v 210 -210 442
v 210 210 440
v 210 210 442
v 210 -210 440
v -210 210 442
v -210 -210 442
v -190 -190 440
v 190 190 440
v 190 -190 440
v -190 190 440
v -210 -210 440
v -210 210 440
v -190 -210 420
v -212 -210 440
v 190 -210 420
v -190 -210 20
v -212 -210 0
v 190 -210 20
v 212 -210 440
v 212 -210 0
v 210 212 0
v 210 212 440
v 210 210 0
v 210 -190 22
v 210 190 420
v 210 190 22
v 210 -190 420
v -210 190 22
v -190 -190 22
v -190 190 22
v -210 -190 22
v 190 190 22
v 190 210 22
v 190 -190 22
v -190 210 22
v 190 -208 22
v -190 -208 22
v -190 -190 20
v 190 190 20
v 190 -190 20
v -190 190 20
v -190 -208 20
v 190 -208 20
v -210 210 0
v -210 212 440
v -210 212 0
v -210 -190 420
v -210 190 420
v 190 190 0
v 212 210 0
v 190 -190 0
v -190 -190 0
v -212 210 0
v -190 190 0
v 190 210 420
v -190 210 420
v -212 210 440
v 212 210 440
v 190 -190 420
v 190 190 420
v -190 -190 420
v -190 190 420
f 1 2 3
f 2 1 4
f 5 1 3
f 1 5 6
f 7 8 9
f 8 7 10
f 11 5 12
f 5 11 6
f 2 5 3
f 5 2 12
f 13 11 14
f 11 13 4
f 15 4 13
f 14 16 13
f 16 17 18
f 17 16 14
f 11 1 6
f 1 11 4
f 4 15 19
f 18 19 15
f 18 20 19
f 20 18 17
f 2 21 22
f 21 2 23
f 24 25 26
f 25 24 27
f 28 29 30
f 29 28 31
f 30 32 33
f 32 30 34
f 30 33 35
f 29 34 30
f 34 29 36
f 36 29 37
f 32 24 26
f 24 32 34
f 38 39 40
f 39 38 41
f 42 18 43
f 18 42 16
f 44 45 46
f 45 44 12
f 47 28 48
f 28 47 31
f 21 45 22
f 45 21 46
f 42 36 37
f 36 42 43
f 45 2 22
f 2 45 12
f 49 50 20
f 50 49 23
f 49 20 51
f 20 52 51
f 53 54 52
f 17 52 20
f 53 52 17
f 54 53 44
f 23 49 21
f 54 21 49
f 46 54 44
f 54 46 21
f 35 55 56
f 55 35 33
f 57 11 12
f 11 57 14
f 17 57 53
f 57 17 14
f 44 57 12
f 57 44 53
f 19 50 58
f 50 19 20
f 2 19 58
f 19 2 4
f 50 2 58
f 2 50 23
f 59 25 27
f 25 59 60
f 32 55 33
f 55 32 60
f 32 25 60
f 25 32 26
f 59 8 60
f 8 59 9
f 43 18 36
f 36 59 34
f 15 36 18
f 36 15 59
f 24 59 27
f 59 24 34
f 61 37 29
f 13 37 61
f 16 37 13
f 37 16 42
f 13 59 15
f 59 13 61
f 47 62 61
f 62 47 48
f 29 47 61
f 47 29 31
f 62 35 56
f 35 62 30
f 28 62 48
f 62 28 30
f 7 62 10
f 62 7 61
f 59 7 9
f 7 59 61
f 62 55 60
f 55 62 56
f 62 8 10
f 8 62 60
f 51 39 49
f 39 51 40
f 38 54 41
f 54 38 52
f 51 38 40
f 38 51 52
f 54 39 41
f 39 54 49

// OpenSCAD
/*[ PROPRTTIES ]*/
height = 400; //z
width = 400; //x
depth = 400; //y

holesH = 3;
holesV = 3;

xcount = 2;
ycount = 2;

extrusionSize = 20;
panelThickness = 2;

showVolume = 0;
frame = 1;
panels = 1;
doors = 0;

opacity =.25;
opacity2 =.15;

// inner volume of the chamber
scale([showVolume, showVolume, showVolume]) {
    translate([-width/2, -depth/2, 0+extrusionSize]) 
		cube([width, depth, height]);
}

//make panels
if (panels == 1) {
	translate([
		-width/2-extrusionSize/2,
		-depth/2-extrusionSize/2,
		height+extrusionSize*2
		]) 
		color([.5,1,1,opacity2])
		cube([width+extrusionSize, depth+extrusionSize, panelThickness]);
	
	translate([
		-width/2-extrusionSize/2,
		-depth/2-extrusionSize/2+panelThickness,
		0+extrusionSize
		]) 
		color([.5,1,1,opacity2])
		cube([width+extrusionSize, depth+extrusionSize, panelThickness]);
	
	translate([
		-width/2-extrusionSize/2,
		depth/2+extrusionSize/2,
		0
		]) 
		color([.5,1,1,opacity2])
		cube([width+extrusionSize, panelThickness, height+extrusionSize*2]);
	
	translate([
		-width/2-extrusionSize/2-panelThickness,
		-depth/2-extrusionSize/2,
		0
		]) 
		color([.5,1,1,opacity2])
		cube([panelThickness, depth+extrusionSize, height+extrusionSize*2]);
	
	translate([
		width/2+extrusionSize/2,
		-depth/2-extrusionSize/2,
		0]) 
		color([.5,1,1,opacity2])
		cube([panelThickness, depth+extrusionSize, height+extrusionSize*2]);
	
	
	//doors
	if (doors==1) {
		translate([
			-width/2-extrusionSize/2,
			-depth/2-extrusionSize/2-panelThickness,
			0
			]) 
			color([.5,1,1,opacity2])
			cube([width/2+extrusionSize/2, panelThickness, height+extrusionSize*2]);
	
		translate([
			0,
			-depth/2-extrusionSize/2-panelThickness,
			0
			]) 
			color([.5,1,1,opacity2])
			cube([width/2+extrusionSize/2, panelThickness, height+extrusionSize*2]);
	}
}

//generate Base frame
if (frame == 1) {
	//vertical
	translate([ //back right
		width/2-extrusionSize/2, //x
		depth/2-extrusionSize/2, //y
		0+extrusionSize //z
		]) 
		color([0,0,1,opacity])
		cube([extrusionSize, extrusionSize, height]);

	translate([ //front right
		width/2-extrusionSize/2, //x
		-depth/2-extrusionSize/2, //y
		0+extrusionSize //z
		]) 
		color([0,0,1,opacity])
		cube([extrusionSize, extrusionSize, height]);
		
	translate([ //front left
		-width/2-extrusionSize/2, //x
		-depth/2-extrusionSize/2, //y
		0+extrusionSize //z
		]) 
		color([0,0,1,opacity])
		cube([extrusionSize, extrusionSize, height]);
	
	translate([ //back left
		-width/2-extrusionSize/2, //x 
		depth/2-extrusionSize/2,  //y
		0+extrusionSize //z
		]) 
		color([0,0,1,opacity])
		cube([extrusionSize, extrusionSize, height]);
	
	//bottom
	translate([ //right
		width/2-extrusionSize/2, 
		-depth/2-extrusionSize/2, 
		height+extrusionSize
		])
		color([0,1,1,opacity])
		cube([extrusionSize, depth+extrusionSize, extrusionSize]);
	
	translate([ //left
		-width/2-extrusionSize/2, 
		-depth/2-extrusionSize/2, 
		height+extrusionSize
		])
		color([0,1,1,opacity])
		cube([extrusionSize, depth+extrusionSize, extrusionSize]);
	
	translate([ //front
		-width/2-extrusionSize/2+extrusionSize, 
		-depth/2-extrusionSize/2, 
		height+extrusionSize
		])
		color([0,1,1,opacity])
		cube([width-extrusionSize, extrusionSize, extrusionSize]);
	
	translate([
		-width/2-extrusionSize/2+extrusionSize, 
		depth/2-extrusionSize/2, 
		height+extrusionSize
		])
		color([0,1,1,opacity])
		cube([width-extrusionSize, extrusionSize, extrusionSize]);
	
	//top
	translate([
		width/2-extrusionSize/2, 
		-depth/2-extrusionSize/2, 
		0
		])
		color([0,1,0,opacity])
		cube([extrusionSize, depth+extrusionSize, extrusionSize]);
	
	translate([
		-width/2-extrusionSize/2, 
		-depth/2-extrusionSize/2, 
		0
		])
		color([0,1,0,opacity])
		cube([extrusionSize, depth+extrusionSize, extrusionSize]);
	
	translate([
		-width/2-extrusionSize/2+extrusionSize, 
		-depth/2-extrusionSize/2, 
		0
		])
		color([0,1,0,opacity])
		cube([width-extrusionSize, extrusionSize, extrusionSize]);
	
	translate([
		-width/2-extrusionSize/2+extrusionSize, 
		depth/2-extrusionSize/2, 
		0
		])
		color([0,1,0,opacity])
		cube([width-extrusionSize, extrusionSize, extrusionSize]);
}	
//for (a=[0:xcount-1]) {
//	translate([-depth/2, -width/2, 0]) 
//		cube([depth, width, height]);
//}
